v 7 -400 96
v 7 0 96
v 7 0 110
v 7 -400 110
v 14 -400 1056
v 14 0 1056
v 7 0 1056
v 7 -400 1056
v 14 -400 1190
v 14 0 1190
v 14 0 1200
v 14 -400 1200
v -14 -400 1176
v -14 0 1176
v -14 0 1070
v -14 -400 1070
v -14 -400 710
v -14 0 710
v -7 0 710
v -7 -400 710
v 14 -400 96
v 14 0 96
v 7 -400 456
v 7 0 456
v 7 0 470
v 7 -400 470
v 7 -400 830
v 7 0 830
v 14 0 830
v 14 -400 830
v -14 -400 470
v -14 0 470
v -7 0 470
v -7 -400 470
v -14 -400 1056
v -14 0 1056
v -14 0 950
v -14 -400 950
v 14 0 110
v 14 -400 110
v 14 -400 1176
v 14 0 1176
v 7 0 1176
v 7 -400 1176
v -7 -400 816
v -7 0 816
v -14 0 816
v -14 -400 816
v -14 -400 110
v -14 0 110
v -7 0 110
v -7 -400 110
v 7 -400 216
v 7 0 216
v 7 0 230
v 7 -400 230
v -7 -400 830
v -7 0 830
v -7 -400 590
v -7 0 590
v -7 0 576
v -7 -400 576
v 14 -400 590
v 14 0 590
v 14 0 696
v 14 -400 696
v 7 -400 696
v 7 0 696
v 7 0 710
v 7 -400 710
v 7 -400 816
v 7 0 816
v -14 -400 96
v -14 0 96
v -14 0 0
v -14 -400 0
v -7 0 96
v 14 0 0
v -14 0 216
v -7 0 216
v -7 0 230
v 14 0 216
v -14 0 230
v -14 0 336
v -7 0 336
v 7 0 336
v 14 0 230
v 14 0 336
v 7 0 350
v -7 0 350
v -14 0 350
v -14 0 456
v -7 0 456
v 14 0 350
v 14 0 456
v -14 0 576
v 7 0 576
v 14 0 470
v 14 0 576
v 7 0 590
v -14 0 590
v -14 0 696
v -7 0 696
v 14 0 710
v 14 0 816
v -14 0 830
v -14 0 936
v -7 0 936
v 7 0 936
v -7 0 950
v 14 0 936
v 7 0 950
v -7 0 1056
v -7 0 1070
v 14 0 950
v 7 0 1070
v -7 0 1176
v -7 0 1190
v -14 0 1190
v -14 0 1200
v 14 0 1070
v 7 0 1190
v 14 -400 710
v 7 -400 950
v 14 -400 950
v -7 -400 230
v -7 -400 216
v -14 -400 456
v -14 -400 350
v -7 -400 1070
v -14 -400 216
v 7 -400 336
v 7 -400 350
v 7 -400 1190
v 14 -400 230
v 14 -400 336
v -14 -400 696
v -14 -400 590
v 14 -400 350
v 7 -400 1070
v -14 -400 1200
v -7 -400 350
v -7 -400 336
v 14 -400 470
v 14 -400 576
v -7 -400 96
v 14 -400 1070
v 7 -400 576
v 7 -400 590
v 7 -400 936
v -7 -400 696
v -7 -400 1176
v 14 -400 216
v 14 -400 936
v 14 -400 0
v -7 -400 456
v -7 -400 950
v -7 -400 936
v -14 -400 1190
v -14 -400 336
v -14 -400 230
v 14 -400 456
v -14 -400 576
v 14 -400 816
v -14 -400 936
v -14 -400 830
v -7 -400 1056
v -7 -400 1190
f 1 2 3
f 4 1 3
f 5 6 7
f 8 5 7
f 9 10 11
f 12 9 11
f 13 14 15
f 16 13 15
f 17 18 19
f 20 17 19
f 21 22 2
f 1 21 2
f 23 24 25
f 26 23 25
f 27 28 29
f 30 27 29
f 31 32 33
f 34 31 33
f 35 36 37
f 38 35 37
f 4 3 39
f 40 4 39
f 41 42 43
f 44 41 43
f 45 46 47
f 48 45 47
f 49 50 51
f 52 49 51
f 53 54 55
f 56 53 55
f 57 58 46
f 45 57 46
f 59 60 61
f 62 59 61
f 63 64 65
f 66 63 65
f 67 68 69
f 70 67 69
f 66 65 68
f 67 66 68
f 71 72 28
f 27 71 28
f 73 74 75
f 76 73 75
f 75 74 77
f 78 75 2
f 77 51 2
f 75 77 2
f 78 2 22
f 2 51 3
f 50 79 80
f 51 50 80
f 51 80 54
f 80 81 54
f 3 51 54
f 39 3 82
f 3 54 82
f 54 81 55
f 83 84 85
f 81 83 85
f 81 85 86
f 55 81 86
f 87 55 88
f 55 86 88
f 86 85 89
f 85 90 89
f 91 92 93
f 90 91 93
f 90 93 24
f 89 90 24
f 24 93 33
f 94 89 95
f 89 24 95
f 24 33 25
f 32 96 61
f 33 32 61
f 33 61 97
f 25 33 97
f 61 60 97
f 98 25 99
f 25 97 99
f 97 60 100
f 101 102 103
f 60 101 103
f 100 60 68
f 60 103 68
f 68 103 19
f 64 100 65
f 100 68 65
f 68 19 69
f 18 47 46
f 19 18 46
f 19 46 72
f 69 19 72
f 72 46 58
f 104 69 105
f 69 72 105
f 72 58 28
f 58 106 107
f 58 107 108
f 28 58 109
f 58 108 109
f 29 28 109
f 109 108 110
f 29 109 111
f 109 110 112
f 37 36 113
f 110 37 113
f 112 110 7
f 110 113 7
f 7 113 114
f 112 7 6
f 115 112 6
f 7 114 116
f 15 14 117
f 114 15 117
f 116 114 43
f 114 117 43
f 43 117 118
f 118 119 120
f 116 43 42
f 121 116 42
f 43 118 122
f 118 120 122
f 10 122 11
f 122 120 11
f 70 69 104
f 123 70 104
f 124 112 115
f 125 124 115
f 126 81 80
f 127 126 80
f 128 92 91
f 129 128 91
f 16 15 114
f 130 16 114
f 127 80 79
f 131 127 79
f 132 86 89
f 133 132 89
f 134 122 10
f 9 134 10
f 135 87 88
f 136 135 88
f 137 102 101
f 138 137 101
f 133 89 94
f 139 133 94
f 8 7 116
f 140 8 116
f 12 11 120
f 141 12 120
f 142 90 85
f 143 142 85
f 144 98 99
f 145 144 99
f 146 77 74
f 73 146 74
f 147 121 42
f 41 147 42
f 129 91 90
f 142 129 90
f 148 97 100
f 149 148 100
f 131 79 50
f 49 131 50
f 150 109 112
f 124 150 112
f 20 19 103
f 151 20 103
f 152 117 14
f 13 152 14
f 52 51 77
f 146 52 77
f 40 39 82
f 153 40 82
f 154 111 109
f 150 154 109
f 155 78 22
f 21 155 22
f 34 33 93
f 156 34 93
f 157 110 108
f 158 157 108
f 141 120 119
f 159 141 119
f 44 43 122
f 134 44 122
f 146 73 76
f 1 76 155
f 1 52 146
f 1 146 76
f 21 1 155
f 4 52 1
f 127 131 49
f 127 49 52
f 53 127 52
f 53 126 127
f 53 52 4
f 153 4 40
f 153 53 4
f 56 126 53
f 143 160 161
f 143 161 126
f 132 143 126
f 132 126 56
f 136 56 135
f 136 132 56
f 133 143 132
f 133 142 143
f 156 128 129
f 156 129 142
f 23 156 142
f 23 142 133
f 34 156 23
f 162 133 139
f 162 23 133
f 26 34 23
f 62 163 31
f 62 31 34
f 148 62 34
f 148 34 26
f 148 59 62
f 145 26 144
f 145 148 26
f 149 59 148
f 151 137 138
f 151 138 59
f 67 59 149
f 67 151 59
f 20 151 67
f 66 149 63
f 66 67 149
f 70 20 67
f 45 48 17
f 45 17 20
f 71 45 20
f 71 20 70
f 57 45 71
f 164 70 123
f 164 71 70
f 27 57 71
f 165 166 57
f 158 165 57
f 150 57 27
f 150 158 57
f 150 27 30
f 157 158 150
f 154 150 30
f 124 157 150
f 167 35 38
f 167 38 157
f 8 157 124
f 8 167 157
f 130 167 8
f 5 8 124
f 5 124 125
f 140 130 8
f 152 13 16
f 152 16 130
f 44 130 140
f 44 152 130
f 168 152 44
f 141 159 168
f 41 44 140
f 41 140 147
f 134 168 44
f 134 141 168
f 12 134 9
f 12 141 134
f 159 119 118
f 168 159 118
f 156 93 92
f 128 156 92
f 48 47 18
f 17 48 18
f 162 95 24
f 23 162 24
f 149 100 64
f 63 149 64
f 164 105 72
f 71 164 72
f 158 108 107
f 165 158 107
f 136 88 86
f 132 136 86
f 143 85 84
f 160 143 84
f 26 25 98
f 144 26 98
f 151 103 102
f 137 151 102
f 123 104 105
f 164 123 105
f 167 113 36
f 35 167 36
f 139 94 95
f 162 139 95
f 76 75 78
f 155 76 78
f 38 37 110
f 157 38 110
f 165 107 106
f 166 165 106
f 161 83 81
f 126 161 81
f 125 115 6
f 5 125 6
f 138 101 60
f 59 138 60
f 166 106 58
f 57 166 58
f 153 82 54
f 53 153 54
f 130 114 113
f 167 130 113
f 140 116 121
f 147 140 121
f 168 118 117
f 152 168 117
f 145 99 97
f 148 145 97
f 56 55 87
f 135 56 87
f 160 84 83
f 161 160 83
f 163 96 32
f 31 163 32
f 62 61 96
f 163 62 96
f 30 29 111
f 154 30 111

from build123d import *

# Parameters (mm, degrees)
F1_DEPTH = 400


with BuildPart() as f1:
    # F0 (on Front) → F1 (new body)
    with BuildSketch(Plane.XZ):
        Polygon((-14, 0), (0, 0), (14, 0), (14, 96), (7, 96), (7, 110), (14, 110), (14, 216), (7, 216), (7, 230), (14, 230), (14, 336), (7, 336), (7, 350), (14, 350), (14, 456), (7, 456), (7, 470), (14, 470), (14, 576), (7, 576), (7, 590), (14, 590), (14, 696), (7, 696), (7, 710), (14, 710), (14, 816), (7, 816), (7, 830), (14, 830), (14, 936), (7, 936), (7, 950), (14, 950), (14, 1056), (7, 1056), (7, 1070), (14, 1070), (14, 1176), (7, 1176), (7, 1190), (14, 1190), (14, 1200), (0, 1200), (-14, 1200), (-14, 1190), (-7, 1190), (-7, 1176), (-14, 1176), (-14, 1070), (-7, 1070), (-7, 1056), (-14, 1056), (-14, 950), (-7, 950), (-7, 936), (-14, 936), (-14, 830), (-7, 830), (-7, 816), (-14, 816), (-14, 710), (-7, 710), (-7, 696), (-14, 696), (-14, 590), (-7, 590), (-7, 576), (-14, 576), (-14, 470), (-7, 470), (-7, 456), (-14, 456), (-14, 350), (-7, 350), (-7, 336), (-14, 336), (-14, 230), (-7, 230), (-7, 216), (-14, 216), (-14, 110), (-7, 110), (-7, 96), (-14, 96), align=None)
    extrude(amount=F1_DEPTH)


solid = f1.part
